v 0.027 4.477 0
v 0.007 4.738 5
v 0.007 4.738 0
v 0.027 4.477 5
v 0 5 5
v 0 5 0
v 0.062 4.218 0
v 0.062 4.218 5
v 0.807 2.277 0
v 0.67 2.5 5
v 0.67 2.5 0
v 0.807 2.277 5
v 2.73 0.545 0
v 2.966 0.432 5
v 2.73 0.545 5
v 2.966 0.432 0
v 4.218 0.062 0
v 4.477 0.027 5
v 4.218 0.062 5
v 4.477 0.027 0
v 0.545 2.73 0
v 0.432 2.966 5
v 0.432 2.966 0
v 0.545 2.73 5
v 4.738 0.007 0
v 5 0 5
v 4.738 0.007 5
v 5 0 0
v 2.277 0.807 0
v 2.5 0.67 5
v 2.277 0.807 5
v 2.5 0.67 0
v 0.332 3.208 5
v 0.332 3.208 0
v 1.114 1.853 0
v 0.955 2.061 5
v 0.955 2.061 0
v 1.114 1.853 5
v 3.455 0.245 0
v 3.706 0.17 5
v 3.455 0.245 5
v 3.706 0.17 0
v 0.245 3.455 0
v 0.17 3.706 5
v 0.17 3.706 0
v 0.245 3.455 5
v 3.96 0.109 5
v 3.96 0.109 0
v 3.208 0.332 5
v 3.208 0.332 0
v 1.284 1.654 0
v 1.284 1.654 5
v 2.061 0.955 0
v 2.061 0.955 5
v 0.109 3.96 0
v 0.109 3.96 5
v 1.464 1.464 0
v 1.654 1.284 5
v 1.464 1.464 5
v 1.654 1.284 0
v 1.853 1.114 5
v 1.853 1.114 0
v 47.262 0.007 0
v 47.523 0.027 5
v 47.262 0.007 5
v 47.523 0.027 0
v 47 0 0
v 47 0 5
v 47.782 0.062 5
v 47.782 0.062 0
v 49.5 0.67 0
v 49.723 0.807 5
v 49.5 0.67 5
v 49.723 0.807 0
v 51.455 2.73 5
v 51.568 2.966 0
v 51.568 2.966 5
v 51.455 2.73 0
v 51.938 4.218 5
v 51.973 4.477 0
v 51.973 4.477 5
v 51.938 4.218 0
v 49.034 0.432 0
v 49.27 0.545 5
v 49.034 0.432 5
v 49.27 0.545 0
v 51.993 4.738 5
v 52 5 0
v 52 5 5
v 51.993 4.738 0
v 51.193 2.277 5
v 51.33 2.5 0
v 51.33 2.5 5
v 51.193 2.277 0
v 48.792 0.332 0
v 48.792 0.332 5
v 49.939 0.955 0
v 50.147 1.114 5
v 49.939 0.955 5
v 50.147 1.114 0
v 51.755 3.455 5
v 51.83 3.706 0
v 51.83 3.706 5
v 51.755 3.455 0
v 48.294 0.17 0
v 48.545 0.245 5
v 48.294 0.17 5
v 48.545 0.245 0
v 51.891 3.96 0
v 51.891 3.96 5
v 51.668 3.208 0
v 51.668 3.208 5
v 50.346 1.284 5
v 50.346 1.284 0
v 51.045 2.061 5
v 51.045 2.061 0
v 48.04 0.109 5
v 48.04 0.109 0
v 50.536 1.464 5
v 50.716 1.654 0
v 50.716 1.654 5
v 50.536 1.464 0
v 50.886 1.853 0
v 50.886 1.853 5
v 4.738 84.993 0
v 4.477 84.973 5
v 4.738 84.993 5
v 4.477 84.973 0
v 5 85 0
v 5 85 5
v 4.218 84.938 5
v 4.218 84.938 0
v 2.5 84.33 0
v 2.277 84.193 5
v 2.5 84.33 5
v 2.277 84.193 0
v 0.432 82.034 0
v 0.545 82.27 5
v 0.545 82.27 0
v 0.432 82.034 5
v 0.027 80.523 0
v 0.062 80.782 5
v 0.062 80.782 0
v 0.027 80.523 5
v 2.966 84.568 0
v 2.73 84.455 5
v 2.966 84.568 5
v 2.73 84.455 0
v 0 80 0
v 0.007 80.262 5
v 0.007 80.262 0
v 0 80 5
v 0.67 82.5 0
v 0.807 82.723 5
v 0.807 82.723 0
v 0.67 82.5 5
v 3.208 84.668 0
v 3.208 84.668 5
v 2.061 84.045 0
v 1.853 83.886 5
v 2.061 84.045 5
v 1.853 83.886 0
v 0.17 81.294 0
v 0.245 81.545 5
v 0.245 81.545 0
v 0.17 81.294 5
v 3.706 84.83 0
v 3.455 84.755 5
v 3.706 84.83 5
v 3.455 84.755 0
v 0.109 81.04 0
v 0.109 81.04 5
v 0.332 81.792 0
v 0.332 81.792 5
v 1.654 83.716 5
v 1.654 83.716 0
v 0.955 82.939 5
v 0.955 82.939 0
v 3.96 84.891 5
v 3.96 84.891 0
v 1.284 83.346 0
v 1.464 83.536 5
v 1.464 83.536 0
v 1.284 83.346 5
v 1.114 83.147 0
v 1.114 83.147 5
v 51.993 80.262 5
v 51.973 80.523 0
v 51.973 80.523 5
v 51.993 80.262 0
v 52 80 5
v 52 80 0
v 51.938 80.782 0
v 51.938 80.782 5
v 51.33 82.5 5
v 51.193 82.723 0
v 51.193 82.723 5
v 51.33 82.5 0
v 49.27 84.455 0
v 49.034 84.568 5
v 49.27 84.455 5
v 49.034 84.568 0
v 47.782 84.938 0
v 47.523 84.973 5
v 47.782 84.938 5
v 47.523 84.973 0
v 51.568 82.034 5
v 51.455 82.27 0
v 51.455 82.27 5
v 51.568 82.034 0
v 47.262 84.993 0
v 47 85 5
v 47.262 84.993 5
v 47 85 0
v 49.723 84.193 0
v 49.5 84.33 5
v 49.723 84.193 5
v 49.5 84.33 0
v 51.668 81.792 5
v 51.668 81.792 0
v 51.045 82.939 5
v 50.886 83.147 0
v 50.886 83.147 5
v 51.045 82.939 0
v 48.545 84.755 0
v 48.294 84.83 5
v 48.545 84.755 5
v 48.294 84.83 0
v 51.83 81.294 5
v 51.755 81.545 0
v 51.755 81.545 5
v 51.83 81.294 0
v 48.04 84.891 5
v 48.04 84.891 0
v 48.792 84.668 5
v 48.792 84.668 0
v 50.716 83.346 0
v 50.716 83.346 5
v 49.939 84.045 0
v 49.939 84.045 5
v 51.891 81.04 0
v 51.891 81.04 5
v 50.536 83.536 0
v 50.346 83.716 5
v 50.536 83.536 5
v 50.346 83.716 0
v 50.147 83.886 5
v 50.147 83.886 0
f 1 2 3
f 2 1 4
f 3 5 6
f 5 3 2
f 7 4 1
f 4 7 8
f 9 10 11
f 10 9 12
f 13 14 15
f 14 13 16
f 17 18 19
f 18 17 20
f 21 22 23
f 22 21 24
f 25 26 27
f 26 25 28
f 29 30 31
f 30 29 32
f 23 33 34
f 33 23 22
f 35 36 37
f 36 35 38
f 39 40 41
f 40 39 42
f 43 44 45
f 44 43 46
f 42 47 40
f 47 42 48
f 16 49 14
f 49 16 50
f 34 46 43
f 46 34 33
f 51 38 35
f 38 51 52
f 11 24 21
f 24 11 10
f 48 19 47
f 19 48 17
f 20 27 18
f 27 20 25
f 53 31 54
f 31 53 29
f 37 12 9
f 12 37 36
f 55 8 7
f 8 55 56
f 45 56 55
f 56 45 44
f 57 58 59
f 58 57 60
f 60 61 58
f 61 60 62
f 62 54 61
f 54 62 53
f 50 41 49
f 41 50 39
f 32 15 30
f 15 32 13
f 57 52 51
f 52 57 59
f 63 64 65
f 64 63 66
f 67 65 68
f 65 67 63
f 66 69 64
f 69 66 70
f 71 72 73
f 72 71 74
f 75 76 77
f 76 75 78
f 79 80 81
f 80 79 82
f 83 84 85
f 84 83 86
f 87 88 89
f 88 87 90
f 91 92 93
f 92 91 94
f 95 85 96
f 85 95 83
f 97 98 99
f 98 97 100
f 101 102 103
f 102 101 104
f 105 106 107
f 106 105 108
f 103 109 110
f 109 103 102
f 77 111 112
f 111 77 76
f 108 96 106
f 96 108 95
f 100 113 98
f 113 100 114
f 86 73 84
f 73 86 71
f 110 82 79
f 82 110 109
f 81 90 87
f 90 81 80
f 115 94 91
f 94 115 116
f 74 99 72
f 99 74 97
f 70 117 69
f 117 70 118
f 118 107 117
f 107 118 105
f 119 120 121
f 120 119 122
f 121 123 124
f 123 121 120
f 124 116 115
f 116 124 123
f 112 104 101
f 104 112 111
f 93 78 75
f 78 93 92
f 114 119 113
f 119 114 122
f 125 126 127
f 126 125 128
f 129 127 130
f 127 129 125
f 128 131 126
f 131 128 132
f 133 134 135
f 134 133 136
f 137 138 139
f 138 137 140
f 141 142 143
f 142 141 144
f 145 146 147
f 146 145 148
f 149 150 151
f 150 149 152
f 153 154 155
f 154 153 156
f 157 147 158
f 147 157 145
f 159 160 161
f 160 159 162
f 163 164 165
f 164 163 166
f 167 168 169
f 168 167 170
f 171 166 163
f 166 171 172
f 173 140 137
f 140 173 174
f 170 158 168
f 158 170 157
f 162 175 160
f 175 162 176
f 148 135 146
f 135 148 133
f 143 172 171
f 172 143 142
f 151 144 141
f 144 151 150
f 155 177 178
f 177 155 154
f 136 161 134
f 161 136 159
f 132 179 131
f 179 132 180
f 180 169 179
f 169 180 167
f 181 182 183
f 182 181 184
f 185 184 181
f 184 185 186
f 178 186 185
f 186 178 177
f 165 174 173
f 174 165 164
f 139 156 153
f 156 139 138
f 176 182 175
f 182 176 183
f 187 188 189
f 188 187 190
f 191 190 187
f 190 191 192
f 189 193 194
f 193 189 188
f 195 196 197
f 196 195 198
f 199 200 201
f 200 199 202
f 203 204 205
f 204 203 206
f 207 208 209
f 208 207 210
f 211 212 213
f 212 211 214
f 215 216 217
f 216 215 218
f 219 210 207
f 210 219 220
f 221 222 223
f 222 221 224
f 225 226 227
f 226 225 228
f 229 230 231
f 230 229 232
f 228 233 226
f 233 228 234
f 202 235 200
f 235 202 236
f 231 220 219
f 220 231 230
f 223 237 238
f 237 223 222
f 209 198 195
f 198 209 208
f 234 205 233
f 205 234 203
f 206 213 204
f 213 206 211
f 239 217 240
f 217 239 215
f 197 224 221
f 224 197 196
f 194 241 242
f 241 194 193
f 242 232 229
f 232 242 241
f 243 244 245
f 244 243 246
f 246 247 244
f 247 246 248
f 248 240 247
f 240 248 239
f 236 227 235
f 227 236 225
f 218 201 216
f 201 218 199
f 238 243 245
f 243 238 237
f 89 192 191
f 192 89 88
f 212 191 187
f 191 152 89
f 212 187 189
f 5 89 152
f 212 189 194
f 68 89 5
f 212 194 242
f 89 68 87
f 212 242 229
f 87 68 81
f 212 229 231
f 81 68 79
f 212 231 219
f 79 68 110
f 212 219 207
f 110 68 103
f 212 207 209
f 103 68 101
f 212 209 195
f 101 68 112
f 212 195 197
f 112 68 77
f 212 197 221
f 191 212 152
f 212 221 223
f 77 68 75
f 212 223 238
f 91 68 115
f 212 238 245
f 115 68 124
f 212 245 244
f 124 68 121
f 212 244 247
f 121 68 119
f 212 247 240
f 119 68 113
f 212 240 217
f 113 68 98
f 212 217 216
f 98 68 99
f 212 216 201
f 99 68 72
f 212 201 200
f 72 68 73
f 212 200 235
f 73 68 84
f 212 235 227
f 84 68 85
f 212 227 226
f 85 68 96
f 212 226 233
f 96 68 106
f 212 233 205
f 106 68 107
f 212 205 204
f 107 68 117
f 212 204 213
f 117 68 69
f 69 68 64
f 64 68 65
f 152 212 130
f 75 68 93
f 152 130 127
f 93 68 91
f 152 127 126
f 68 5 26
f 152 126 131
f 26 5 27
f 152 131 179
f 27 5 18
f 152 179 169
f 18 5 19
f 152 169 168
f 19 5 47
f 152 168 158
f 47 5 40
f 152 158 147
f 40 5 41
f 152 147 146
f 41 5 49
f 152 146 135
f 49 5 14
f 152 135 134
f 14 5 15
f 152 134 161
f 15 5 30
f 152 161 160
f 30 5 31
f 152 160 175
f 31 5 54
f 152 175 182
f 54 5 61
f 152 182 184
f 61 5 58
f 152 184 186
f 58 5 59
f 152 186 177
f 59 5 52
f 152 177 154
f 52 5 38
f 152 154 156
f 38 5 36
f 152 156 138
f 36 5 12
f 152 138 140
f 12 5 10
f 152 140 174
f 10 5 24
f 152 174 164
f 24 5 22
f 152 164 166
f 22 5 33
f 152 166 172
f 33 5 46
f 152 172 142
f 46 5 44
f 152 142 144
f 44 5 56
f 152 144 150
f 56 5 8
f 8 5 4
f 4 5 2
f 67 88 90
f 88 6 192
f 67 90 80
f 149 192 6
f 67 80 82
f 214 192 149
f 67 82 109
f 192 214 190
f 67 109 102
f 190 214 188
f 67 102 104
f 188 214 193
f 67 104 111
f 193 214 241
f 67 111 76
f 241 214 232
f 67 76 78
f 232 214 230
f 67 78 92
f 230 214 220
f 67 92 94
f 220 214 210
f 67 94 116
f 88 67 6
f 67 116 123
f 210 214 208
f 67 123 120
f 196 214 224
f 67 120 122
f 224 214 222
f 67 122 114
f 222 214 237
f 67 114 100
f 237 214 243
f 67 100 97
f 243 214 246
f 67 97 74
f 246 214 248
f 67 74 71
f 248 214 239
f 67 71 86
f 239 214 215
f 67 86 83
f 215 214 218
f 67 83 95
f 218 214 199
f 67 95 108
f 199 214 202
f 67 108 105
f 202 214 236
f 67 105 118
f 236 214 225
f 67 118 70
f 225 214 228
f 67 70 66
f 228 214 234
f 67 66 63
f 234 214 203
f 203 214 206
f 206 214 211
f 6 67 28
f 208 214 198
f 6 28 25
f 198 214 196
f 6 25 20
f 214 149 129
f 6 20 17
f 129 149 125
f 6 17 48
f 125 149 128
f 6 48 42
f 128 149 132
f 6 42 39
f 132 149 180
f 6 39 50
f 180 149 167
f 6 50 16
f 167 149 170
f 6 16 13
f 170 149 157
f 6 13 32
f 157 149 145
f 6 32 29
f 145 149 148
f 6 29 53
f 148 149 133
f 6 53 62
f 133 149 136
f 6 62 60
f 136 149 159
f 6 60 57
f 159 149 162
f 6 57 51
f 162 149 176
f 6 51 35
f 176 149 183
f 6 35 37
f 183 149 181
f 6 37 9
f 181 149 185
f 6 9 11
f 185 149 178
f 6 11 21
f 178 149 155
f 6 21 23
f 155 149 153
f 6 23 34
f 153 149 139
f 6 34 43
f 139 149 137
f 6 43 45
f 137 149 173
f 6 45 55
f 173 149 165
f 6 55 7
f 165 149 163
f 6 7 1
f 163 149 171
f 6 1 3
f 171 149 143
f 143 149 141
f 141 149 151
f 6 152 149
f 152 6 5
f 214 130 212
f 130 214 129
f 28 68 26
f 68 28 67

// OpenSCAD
// 86 x 54 x 9 
width = 52;
height = 85;
radius = 5;

spacing = 5;

$fn = 120;

module inverseArc() {
    #translate([0, 0, -1])
        difference() {
            cube([radius + 1, radius + 1, spacing + 2]);

            translate([0, 0, 4])
                cylinder(spacing + 4, radius, radius, true);
        }
}

difference() {
    cube([width, height, spacing]);

    translate([radius, radius, 0])
        rotate([0, 0, 180])
        inverseArc();

    translate([width - radius, radius, 0])
        rotate([0, 0, 270])
        inverseArc();

    translate([radius, height - radius, 0])
        rotate([0, 0, 90])
        inverseArc();

    translate([width - radius, height - radius, 0])
        rotate([0, 0, 0])
        inverseArc();
}
